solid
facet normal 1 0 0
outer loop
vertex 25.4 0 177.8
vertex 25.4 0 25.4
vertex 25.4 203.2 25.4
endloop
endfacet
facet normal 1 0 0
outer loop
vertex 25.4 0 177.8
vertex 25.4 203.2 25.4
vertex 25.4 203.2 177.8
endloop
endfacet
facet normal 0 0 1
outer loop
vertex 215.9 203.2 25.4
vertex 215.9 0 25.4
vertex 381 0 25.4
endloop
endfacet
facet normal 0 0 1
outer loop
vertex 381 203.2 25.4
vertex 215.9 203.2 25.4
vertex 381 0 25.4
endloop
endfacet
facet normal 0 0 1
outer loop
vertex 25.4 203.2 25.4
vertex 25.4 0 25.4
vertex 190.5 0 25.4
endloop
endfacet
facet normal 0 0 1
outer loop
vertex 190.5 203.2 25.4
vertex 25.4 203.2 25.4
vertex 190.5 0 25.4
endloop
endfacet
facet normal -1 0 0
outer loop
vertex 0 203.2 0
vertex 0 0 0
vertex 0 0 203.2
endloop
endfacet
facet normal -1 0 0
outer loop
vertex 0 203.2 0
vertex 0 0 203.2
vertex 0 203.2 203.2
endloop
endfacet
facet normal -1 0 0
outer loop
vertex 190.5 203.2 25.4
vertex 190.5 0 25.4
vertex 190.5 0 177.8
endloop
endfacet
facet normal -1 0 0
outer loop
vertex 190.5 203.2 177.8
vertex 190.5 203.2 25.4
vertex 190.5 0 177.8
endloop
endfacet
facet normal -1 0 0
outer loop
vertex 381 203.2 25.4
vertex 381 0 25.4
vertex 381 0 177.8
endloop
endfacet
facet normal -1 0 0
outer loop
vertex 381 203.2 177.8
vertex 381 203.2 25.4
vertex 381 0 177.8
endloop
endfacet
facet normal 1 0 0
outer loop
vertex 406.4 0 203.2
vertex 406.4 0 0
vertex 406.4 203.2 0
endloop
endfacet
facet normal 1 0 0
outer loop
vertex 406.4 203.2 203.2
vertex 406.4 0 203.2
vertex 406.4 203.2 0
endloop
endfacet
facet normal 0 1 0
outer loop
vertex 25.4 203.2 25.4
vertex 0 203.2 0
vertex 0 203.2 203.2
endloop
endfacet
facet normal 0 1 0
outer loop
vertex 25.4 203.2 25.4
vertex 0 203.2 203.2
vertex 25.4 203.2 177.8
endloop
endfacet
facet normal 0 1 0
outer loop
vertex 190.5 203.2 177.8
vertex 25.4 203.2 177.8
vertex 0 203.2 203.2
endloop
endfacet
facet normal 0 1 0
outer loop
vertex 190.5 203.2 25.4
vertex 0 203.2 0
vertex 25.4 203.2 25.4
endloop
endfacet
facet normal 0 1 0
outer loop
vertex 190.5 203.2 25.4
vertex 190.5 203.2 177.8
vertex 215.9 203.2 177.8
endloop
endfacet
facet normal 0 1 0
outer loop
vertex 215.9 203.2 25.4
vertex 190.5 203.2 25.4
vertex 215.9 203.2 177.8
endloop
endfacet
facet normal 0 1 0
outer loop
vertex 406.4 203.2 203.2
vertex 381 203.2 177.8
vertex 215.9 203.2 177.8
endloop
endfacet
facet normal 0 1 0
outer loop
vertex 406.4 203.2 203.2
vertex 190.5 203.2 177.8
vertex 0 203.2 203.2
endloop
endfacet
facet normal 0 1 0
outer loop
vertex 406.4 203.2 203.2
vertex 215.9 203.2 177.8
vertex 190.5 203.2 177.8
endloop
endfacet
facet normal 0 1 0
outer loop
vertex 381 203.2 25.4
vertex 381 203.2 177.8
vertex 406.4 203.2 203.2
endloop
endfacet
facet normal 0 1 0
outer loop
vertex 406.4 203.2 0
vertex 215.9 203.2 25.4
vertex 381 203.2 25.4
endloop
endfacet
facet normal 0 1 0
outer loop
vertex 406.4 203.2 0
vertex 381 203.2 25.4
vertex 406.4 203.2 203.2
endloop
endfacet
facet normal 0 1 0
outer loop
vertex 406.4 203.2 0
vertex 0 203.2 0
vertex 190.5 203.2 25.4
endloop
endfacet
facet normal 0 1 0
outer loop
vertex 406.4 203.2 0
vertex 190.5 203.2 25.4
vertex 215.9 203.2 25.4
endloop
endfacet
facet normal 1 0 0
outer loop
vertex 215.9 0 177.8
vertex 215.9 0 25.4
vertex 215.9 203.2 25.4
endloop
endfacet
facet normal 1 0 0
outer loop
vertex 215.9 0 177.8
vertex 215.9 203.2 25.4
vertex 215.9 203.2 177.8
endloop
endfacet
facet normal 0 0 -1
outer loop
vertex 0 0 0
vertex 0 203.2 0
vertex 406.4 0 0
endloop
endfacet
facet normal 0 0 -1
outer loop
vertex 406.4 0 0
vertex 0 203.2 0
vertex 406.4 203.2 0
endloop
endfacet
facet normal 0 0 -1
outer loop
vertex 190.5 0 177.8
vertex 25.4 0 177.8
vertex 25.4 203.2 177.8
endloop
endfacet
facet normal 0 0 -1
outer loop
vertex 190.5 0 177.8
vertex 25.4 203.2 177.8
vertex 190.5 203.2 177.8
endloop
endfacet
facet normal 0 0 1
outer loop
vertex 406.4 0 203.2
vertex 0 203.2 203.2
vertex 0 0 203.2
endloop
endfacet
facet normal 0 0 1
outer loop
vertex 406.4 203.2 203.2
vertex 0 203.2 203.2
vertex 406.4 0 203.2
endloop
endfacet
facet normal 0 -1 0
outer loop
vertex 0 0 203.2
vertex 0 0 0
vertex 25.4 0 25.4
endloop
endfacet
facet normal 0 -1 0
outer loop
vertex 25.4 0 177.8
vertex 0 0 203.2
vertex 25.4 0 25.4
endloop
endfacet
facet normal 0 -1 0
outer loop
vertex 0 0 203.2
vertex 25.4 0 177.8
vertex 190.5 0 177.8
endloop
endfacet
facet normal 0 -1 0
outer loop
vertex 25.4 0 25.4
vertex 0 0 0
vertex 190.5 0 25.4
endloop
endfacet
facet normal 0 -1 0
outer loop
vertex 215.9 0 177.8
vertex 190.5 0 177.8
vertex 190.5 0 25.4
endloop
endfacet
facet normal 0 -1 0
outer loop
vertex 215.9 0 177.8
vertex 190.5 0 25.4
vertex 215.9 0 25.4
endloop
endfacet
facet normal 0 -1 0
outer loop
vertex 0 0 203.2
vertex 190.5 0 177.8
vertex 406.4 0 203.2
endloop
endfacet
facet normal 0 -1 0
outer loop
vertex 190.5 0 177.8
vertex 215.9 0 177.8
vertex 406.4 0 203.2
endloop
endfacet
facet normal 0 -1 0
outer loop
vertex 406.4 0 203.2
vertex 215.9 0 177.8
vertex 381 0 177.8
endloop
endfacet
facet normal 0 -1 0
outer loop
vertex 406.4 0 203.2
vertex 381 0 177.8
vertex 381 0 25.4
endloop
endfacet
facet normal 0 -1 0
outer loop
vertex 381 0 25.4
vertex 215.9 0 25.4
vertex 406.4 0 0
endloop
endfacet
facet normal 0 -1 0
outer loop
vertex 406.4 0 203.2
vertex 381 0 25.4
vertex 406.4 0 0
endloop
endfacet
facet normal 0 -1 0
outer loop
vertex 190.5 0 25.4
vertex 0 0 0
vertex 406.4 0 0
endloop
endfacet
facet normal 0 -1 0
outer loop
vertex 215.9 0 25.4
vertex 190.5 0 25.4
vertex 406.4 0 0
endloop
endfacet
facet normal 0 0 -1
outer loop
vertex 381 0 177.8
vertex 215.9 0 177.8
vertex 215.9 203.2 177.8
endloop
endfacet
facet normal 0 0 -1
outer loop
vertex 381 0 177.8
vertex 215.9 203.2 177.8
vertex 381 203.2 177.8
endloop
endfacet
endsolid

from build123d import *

# Parameters (mm, degrees)
F0_W     = 406.4
F0_H     = 203.2
F1_DEPTH = 203.2
F2_W     = 165.1
F2_H     = 152.4
F3_DEPTH = 203.201
F4_DEPTH = 203.201


with BuildPart() as f1:
    # F0 (on Top) → F1 (new body)
    with BuildSketch(Plane.XY):
        with Locations((203.2, 101.6)):
            Rectangle(F0_W, F0_H)
    extrude(amount=F1_DEPTH)

    # F2 (on face) → F3 (cut, through all)
    with BuildSketch(Plane.XZ):
        with Locations((107.95, 101.6)):
            Rectangle(F2_W, F2_H)
        with Locations((298.45, 101.6)):
            Rectangle(F2_W, F2_H)
    extrude(amount=-F3_DEPTH, mode=Mode.SUBTRACT)

    # F2 (on face) → F4 (cut, through all)
    with BuildSketch(Plane.XZ):
        with Locations((107.95, 101.6)):
            Rectangle(F2_W, F2_H)
        with Locations((298.45, 101.6)):
            Rectangle(F2_W, F2_H)
    extrude(amount=-F4_DEPTH, mode=Mode.SUBTRACT)


solid = f1.part
